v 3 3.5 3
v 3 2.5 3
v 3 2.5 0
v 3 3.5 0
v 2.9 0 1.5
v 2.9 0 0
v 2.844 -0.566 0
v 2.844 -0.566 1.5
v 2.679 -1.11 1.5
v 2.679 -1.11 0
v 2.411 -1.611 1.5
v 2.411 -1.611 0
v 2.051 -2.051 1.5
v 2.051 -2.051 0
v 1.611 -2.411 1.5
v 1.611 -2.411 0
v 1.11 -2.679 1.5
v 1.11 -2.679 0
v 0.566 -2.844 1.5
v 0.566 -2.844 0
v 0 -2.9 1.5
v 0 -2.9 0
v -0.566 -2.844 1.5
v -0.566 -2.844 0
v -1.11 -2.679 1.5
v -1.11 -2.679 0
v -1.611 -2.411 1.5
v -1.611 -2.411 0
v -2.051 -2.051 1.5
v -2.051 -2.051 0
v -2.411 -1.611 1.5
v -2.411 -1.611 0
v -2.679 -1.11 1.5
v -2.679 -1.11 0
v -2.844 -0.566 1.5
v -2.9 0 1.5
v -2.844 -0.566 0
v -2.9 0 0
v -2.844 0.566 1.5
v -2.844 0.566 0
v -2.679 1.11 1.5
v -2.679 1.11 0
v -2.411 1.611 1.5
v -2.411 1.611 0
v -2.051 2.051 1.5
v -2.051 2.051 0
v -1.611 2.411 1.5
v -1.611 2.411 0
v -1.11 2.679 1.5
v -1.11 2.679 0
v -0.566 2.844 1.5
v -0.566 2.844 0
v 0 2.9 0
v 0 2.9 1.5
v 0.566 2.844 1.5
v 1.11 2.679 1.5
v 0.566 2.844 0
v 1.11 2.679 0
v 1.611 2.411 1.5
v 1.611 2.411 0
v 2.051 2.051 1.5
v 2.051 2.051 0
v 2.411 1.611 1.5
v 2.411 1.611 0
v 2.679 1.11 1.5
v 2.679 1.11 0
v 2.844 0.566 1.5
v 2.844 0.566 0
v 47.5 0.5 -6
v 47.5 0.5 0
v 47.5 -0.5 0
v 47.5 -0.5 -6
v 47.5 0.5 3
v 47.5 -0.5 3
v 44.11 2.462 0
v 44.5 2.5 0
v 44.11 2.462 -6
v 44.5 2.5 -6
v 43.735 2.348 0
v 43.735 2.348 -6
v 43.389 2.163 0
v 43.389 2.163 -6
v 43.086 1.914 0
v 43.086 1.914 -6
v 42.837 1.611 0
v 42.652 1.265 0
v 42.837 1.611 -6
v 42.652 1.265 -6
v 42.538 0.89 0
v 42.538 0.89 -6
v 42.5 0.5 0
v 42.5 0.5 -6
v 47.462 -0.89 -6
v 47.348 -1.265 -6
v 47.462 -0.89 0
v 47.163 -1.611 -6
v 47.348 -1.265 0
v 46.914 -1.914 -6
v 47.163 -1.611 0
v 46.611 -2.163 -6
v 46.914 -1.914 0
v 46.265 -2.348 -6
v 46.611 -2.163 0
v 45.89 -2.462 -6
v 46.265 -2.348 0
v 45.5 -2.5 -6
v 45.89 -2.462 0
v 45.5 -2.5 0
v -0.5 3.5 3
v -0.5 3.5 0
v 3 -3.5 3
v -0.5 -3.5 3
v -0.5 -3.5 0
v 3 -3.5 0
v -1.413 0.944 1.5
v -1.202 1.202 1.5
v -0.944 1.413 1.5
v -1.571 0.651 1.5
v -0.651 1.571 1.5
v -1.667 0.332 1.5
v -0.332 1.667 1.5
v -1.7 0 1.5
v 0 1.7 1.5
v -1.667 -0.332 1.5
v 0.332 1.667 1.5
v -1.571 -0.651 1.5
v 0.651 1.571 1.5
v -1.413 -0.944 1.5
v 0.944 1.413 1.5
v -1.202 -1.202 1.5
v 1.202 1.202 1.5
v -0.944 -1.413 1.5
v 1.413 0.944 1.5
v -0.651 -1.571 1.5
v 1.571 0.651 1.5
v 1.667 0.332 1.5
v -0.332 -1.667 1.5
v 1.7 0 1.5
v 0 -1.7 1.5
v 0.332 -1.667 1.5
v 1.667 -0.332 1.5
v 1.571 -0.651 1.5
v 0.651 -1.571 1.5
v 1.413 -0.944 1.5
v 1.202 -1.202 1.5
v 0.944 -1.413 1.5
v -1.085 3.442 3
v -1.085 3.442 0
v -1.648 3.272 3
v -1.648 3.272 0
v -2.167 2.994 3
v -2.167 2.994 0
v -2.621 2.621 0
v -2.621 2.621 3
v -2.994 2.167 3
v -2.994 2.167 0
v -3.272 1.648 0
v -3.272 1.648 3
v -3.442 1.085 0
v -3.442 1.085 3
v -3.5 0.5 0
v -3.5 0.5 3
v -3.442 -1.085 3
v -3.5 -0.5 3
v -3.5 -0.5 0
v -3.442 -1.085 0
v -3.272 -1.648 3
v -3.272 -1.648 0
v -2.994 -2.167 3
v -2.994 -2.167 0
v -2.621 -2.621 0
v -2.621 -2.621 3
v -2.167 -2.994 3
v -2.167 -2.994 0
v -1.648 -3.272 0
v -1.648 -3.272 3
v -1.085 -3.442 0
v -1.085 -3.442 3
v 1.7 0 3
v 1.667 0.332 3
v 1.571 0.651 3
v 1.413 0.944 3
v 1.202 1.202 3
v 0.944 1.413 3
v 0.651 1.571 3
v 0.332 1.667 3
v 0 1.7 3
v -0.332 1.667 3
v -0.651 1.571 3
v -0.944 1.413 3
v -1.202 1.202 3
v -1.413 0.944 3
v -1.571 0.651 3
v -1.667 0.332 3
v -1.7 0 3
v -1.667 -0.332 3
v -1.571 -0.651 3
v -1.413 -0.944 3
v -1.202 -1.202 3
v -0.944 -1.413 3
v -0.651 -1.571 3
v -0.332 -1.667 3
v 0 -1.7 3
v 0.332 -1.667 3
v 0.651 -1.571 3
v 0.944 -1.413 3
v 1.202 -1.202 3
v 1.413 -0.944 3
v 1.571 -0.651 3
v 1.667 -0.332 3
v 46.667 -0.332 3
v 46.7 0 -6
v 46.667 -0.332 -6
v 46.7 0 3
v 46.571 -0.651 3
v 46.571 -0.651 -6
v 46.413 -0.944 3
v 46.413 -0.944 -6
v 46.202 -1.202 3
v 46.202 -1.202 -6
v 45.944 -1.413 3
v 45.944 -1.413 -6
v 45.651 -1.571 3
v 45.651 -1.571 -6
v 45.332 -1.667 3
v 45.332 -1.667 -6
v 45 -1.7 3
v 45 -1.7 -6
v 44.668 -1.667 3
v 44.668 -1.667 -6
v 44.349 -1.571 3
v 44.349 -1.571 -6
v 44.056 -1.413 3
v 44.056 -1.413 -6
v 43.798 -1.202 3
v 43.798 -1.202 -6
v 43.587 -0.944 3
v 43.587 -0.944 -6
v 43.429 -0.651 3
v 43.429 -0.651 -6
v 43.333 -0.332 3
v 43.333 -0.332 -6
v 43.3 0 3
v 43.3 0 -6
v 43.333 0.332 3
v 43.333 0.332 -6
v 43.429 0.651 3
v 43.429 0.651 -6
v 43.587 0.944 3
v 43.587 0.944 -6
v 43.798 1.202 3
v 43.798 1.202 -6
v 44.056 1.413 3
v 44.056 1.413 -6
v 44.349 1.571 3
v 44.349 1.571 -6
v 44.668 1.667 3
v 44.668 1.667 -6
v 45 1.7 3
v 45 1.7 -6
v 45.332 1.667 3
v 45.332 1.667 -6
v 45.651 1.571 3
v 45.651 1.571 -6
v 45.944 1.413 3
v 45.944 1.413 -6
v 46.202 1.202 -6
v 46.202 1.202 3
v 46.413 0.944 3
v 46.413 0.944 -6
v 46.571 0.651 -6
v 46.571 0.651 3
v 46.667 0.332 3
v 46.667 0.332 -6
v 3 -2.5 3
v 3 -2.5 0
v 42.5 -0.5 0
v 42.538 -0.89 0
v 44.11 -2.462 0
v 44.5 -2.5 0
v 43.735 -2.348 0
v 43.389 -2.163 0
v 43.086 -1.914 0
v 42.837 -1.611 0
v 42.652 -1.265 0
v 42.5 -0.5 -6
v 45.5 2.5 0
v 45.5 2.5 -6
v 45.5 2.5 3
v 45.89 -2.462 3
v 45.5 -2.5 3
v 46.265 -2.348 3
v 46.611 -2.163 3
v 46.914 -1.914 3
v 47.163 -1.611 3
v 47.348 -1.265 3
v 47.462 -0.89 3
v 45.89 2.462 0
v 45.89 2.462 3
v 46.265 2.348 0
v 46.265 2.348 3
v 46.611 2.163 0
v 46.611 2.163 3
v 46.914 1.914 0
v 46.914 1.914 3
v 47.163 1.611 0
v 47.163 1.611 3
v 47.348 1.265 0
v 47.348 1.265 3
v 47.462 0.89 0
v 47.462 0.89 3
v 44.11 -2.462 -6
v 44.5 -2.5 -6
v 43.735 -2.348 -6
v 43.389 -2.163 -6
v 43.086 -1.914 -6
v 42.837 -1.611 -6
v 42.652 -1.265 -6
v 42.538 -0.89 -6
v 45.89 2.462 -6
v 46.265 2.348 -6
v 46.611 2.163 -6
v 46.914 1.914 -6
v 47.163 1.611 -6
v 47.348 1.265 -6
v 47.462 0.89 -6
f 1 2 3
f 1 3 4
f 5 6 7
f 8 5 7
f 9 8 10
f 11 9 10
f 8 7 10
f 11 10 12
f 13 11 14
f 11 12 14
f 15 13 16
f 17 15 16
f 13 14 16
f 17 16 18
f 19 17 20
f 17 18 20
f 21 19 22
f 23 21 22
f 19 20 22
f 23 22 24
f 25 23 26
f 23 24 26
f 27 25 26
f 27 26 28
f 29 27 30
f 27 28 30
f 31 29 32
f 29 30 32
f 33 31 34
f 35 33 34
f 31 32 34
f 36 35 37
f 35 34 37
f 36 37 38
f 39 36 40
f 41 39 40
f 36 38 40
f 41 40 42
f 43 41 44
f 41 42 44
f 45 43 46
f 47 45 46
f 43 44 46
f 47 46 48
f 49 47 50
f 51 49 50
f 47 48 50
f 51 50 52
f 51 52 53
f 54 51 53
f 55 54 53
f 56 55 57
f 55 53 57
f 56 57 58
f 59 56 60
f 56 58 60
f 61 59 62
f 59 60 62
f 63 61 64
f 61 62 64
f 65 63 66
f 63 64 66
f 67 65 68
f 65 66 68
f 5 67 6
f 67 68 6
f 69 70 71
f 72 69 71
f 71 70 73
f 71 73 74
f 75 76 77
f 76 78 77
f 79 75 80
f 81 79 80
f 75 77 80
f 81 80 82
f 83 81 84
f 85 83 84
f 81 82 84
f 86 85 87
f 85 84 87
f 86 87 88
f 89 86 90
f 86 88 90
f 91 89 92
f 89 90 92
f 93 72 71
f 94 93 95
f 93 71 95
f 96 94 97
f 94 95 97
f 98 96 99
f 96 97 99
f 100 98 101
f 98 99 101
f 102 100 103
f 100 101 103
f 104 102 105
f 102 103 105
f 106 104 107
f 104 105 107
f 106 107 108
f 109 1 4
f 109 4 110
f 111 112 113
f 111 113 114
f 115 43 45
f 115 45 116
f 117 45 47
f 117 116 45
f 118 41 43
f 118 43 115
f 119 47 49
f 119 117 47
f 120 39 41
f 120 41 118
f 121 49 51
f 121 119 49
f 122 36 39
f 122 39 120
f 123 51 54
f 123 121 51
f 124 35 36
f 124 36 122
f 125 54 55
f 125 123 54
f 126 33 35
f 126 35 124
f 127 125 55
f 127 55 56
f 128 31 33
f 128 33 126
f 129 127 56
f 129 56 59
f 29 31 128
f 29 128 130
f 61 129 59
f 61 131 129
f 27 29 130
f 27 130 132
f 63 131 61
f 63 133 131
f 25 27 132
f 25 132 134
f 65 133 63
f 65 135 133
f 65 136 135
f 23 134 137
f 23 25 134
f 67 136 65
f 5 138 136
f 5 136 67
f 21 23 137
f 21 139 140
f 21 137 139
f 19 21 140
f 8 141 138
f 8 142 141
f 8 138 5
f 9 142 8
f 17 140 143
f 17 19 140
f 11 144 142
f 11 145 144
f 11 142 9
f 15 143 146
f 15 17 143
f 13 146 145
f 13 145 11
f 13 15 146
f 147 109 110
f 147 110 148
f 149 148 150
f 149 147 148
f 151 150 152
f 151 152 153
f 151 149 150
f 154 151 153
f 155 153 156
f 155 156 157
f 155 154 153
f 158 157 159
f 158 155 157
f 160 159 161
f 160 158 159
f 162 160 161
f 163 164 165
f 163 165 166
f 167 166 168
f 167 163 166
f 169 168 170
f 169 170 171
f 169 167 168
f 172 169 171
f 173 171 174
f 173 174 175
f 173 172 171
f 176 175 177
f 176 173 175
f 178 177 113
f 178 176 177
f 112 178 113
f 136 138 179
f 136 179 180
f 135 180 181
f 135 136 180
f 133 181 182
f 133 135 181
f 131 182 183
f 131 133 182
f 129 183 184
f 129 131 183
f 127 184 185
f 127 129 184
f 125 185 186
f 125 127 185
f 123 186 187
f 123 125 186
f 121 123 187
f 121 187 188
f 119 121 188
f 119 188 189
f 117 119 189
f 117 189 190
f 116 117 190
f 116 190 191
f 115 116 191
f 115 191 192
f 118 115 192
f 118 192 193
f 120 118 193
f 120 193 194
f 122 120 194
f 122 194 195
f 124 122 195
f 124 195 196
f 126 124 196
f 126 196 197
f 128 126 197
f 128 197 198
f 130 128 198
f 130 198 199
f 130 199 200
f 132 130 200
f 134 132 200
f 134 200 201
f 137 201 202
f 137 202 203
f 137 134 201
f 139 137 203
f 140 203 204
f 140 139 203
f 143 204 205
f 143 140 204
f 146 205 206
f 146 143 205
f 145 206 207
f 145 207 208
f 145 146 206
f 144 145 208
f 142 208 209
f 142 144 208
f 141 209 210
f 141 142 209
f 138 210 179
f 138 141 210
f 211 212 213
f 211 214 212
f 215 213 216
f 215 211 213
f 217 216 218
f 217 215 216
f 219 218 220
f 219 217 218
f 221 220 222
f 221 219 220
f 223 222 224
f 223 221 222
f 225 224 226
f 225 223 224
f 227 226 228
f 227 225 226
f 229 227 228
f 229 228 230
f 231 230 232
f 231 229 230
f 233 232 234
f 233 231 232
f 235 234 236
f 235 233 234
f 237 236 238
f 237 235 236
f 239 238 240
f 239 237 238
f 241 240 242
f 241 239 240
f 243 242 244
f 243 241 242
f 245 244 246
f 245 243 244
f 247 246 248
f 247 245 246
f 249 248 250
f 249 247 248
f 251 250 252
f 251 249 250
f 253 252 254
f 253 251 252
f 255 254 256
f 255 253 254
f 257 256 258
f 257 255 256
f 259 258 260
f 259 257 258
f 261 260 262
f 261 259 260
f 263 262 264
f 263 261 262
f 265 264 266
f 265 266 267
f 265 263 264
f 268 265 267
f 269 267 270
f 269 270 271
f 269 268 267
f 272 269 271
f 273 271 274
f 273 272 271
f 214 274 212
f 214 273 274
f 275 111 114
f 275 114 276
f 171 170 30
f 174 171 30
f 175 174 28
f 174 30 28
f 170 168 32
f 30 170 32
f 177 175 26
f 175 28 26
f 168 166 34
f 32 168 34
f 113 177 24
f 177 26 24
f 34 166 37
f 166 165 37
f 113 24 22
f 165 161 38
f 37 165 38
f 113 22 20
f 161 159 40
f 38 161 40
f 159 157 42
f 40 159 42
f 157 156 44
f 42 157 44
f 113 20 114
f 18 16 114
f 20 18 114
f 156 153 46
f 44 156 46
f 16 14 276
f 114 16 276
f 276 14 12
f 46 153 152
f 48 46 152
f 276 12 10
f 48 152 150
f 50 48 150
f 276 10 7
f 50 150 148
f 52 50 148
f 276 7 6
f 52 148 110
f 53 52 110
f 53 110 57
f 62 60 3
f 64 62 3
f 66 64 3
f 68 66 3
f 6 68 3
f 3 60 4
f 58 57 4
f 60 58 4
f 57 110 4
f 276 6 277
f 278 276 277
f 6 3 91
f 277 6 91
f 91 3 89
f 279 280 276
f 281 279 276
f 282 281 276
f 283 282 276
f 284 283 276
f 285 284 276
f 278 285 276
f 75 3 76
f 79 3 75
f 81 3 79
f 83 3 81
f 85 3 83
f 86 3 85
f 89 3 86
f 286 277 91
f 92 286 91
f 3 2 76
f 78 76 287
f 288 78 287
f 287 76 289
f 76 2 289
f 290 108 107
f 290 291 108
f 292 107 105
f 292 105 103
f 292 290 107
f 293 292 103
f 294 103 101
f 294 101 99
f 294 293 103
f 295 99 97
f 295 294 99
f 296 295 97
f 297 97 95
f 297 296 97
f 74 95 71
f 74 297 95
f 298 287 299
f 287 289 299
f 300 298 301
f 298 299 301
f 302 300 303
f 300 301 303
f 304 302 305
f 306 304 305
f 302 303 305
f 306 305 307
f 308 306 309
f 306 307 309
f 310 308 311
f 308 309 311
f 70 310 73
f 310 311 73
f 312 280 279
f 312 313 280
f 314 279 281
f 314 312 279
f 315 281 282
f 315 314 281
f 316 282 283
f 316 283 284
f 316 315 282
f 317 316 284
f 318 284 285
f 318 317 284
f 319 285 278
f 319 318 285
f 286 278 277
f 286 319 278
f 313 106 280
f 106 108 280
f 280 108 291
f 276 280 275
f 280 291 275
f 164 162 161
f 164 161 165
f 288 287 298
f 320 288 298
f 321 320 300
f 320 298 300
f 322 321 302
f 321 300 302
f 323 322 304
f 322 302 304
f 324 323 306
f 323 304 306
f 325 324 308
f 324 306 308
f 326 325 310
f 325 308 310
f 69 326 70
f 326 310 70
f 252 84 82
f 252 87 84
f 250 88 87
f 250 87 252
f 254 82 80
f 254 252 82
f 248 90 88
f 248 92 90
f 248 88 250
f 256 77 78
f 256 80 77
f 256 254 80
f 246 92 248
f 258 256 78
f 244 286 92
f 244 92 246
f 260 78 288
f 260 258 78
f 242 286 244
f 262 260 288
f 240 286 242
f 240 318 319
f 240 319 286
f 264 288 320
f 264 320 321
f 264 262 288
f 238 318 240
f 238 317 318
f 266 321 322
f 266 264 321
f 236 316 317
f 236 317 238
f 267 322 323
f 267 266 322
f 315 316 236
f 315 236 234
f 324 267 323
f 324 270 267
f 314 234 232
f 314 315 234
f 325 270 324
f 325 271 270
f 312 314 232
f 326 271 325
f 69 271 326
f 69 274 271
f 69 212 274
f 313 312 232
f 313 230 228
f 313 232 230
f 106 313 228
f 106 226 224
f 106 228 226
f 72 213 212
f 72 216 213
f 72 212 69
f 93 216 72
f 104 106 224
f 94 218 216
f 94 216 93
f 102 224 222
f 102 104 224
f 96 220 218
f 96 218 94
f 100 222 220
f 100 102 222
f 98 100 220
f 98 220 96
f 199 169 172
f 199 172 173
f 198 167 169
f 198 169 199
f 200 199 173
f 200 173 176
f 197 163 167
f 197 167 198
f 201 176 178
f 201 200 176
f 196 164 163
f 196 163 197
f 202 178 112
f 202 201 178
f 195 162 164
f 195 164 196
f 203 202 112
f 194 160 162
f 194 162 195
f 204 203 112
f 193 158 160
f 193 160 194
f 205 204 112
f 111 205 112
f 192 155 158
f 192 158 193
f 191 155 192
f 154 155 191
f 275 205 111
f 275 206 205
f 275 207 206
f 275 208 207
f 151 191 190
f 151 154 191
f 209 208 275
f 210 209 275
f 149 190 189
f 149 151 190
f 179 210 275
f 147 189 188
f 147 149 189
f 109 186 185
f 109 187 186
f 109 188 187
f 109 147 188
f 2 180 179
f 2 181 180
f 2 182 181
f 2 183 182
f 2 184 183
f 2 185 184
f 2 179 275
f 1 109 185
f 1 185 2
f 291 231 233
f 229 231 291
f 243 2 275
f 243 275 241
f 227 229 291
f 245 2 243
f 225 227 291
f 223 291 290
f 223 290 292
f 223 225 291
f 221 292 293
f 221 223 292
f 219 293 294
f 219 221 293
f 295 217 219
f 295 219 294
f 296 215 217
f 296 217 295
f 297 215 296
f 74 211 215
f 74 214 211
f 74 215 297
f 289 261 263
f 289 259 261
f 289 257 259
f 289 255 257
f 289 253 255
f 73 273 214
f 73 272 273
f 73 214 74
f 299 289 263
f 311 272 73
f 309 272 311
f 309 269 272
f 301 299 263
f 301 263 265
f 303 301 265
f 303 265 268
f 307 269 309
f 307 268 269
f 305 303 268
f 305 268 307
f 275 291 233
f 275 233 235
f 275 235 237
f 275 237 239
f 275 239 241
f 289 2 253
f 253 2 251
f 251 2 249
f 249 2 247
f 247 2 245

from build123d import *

# Parameters (mm, degrees)
F0_R     = 1.7
F1_DEPTH = 3
F2_R     = 2
F3_R     = 1.7
F4_DEPTH = 6
F5_R     = 2
F6_R     = 1.7
F7_DEPTH = 3
F8_R     = 2.9
F9_DEPTH = 1.5


with BuildPart() as f1:
    # F0 (on Top) → F1 (new body)
    with BuildSketch(Plane.XY):
        Polygon((-2.5, 2.5), (-2.5, 0), (-2.5, -2.5), (47.5, -2.5), (47.5, 0), (47.5, 2.5), align=None)
        Circle(F0_R, mode=Mode.SUBTRACT)
        with Locations((45, 0)):
            Circle(F0_R, mode=Mode.SUBTRACT)
    extrude(amount=F1_DEPTH)

    # F2
    f2_edges = [f1.edges().sort_by_distance(p)[0] for p in [
        (-2.5, 2.5, 1.5),
        (-2.5, -2.5, 1.5),
        (47.5, 2.5, 1.5),
        (47.5, -2.5, 1.5),
    ]]
    fillet(f2_edges, radius=F2_R)

    # F3 (on face) → F4 (join)
    with BuildSketch(Plane(origin=(0, 0, 0), x_dir=(1, 0, 0), z_dir=(0, 0, -1))):
        with BuildLine():
            Line((42.5, -2.5), (45.5, -2.5))
            ThreePointArc((45.5, -2.5), (46.9142135624, -1.9142135624), (47.5, -0.5))
            Line((47.5, -0.5), (47.5, 0.5))
            ThreePointArc((47.5, 0.5), (46.9142135624, 1.9142135624), (45.5, 2.5))
            Line((45.5, 2.5), (42.5, 2.5))
            Line((42.5, 2.5), (42.5, -2.5))
        make_face()
        with Locations((45, 0)):
            Circle(F3_R, mode=Mode.SUBTRACT)
    extrude(amount=F4_DEPTH)

    # F5
    f5_edges = [f1.edges().sort_by_distance(p)[0] for p in [
        (42.5, 2.5, -3),
        (42.5, -2.5, -3),
    ]]
    fillet(f5_edges, radius=F5_R)

    # F6 (on face) → F7 (join, through all)
    with BuildSketch(Plane.XY.offset(3)):
        with BuildLine():
            ThreePointArc((-0.5, 3.5), (-2.6213203436, 2.6213203436), (-3.5, 0.5))
            Line((-3.5, 0.5), (-3.5, -0.5))
            ThreePointArc((-3.5, -0.5), (-2.6213203436, -2.6213203436), (-0.5, -3.5))
            Line((-0.5, -3.5), (3, -3.5))
            Line((3, -3.5), (3, -2.5))
            Line((3, -2.5), (3, 2.5))
            Line((3, 2.5), (3, 3.5))
            Line((3, 3.5), (-0.5, 3.5))
        make_face()
        Circle(F6_R, mode=Mode.SUBTRACT)
    extrude(amount=-F7_DEPTH)

    # F8 (on face) → F9 (cut)
    with BuildSketch(Plane(origin=(0, 0, 0), x_dir=(1, 0, 0), z_dir=(0, 0, -1))):
        Circle(F8_R)
    extrude(amount=-F9_DEPTH, mode=Mode.SUBTRACT)


solid = f1.part
